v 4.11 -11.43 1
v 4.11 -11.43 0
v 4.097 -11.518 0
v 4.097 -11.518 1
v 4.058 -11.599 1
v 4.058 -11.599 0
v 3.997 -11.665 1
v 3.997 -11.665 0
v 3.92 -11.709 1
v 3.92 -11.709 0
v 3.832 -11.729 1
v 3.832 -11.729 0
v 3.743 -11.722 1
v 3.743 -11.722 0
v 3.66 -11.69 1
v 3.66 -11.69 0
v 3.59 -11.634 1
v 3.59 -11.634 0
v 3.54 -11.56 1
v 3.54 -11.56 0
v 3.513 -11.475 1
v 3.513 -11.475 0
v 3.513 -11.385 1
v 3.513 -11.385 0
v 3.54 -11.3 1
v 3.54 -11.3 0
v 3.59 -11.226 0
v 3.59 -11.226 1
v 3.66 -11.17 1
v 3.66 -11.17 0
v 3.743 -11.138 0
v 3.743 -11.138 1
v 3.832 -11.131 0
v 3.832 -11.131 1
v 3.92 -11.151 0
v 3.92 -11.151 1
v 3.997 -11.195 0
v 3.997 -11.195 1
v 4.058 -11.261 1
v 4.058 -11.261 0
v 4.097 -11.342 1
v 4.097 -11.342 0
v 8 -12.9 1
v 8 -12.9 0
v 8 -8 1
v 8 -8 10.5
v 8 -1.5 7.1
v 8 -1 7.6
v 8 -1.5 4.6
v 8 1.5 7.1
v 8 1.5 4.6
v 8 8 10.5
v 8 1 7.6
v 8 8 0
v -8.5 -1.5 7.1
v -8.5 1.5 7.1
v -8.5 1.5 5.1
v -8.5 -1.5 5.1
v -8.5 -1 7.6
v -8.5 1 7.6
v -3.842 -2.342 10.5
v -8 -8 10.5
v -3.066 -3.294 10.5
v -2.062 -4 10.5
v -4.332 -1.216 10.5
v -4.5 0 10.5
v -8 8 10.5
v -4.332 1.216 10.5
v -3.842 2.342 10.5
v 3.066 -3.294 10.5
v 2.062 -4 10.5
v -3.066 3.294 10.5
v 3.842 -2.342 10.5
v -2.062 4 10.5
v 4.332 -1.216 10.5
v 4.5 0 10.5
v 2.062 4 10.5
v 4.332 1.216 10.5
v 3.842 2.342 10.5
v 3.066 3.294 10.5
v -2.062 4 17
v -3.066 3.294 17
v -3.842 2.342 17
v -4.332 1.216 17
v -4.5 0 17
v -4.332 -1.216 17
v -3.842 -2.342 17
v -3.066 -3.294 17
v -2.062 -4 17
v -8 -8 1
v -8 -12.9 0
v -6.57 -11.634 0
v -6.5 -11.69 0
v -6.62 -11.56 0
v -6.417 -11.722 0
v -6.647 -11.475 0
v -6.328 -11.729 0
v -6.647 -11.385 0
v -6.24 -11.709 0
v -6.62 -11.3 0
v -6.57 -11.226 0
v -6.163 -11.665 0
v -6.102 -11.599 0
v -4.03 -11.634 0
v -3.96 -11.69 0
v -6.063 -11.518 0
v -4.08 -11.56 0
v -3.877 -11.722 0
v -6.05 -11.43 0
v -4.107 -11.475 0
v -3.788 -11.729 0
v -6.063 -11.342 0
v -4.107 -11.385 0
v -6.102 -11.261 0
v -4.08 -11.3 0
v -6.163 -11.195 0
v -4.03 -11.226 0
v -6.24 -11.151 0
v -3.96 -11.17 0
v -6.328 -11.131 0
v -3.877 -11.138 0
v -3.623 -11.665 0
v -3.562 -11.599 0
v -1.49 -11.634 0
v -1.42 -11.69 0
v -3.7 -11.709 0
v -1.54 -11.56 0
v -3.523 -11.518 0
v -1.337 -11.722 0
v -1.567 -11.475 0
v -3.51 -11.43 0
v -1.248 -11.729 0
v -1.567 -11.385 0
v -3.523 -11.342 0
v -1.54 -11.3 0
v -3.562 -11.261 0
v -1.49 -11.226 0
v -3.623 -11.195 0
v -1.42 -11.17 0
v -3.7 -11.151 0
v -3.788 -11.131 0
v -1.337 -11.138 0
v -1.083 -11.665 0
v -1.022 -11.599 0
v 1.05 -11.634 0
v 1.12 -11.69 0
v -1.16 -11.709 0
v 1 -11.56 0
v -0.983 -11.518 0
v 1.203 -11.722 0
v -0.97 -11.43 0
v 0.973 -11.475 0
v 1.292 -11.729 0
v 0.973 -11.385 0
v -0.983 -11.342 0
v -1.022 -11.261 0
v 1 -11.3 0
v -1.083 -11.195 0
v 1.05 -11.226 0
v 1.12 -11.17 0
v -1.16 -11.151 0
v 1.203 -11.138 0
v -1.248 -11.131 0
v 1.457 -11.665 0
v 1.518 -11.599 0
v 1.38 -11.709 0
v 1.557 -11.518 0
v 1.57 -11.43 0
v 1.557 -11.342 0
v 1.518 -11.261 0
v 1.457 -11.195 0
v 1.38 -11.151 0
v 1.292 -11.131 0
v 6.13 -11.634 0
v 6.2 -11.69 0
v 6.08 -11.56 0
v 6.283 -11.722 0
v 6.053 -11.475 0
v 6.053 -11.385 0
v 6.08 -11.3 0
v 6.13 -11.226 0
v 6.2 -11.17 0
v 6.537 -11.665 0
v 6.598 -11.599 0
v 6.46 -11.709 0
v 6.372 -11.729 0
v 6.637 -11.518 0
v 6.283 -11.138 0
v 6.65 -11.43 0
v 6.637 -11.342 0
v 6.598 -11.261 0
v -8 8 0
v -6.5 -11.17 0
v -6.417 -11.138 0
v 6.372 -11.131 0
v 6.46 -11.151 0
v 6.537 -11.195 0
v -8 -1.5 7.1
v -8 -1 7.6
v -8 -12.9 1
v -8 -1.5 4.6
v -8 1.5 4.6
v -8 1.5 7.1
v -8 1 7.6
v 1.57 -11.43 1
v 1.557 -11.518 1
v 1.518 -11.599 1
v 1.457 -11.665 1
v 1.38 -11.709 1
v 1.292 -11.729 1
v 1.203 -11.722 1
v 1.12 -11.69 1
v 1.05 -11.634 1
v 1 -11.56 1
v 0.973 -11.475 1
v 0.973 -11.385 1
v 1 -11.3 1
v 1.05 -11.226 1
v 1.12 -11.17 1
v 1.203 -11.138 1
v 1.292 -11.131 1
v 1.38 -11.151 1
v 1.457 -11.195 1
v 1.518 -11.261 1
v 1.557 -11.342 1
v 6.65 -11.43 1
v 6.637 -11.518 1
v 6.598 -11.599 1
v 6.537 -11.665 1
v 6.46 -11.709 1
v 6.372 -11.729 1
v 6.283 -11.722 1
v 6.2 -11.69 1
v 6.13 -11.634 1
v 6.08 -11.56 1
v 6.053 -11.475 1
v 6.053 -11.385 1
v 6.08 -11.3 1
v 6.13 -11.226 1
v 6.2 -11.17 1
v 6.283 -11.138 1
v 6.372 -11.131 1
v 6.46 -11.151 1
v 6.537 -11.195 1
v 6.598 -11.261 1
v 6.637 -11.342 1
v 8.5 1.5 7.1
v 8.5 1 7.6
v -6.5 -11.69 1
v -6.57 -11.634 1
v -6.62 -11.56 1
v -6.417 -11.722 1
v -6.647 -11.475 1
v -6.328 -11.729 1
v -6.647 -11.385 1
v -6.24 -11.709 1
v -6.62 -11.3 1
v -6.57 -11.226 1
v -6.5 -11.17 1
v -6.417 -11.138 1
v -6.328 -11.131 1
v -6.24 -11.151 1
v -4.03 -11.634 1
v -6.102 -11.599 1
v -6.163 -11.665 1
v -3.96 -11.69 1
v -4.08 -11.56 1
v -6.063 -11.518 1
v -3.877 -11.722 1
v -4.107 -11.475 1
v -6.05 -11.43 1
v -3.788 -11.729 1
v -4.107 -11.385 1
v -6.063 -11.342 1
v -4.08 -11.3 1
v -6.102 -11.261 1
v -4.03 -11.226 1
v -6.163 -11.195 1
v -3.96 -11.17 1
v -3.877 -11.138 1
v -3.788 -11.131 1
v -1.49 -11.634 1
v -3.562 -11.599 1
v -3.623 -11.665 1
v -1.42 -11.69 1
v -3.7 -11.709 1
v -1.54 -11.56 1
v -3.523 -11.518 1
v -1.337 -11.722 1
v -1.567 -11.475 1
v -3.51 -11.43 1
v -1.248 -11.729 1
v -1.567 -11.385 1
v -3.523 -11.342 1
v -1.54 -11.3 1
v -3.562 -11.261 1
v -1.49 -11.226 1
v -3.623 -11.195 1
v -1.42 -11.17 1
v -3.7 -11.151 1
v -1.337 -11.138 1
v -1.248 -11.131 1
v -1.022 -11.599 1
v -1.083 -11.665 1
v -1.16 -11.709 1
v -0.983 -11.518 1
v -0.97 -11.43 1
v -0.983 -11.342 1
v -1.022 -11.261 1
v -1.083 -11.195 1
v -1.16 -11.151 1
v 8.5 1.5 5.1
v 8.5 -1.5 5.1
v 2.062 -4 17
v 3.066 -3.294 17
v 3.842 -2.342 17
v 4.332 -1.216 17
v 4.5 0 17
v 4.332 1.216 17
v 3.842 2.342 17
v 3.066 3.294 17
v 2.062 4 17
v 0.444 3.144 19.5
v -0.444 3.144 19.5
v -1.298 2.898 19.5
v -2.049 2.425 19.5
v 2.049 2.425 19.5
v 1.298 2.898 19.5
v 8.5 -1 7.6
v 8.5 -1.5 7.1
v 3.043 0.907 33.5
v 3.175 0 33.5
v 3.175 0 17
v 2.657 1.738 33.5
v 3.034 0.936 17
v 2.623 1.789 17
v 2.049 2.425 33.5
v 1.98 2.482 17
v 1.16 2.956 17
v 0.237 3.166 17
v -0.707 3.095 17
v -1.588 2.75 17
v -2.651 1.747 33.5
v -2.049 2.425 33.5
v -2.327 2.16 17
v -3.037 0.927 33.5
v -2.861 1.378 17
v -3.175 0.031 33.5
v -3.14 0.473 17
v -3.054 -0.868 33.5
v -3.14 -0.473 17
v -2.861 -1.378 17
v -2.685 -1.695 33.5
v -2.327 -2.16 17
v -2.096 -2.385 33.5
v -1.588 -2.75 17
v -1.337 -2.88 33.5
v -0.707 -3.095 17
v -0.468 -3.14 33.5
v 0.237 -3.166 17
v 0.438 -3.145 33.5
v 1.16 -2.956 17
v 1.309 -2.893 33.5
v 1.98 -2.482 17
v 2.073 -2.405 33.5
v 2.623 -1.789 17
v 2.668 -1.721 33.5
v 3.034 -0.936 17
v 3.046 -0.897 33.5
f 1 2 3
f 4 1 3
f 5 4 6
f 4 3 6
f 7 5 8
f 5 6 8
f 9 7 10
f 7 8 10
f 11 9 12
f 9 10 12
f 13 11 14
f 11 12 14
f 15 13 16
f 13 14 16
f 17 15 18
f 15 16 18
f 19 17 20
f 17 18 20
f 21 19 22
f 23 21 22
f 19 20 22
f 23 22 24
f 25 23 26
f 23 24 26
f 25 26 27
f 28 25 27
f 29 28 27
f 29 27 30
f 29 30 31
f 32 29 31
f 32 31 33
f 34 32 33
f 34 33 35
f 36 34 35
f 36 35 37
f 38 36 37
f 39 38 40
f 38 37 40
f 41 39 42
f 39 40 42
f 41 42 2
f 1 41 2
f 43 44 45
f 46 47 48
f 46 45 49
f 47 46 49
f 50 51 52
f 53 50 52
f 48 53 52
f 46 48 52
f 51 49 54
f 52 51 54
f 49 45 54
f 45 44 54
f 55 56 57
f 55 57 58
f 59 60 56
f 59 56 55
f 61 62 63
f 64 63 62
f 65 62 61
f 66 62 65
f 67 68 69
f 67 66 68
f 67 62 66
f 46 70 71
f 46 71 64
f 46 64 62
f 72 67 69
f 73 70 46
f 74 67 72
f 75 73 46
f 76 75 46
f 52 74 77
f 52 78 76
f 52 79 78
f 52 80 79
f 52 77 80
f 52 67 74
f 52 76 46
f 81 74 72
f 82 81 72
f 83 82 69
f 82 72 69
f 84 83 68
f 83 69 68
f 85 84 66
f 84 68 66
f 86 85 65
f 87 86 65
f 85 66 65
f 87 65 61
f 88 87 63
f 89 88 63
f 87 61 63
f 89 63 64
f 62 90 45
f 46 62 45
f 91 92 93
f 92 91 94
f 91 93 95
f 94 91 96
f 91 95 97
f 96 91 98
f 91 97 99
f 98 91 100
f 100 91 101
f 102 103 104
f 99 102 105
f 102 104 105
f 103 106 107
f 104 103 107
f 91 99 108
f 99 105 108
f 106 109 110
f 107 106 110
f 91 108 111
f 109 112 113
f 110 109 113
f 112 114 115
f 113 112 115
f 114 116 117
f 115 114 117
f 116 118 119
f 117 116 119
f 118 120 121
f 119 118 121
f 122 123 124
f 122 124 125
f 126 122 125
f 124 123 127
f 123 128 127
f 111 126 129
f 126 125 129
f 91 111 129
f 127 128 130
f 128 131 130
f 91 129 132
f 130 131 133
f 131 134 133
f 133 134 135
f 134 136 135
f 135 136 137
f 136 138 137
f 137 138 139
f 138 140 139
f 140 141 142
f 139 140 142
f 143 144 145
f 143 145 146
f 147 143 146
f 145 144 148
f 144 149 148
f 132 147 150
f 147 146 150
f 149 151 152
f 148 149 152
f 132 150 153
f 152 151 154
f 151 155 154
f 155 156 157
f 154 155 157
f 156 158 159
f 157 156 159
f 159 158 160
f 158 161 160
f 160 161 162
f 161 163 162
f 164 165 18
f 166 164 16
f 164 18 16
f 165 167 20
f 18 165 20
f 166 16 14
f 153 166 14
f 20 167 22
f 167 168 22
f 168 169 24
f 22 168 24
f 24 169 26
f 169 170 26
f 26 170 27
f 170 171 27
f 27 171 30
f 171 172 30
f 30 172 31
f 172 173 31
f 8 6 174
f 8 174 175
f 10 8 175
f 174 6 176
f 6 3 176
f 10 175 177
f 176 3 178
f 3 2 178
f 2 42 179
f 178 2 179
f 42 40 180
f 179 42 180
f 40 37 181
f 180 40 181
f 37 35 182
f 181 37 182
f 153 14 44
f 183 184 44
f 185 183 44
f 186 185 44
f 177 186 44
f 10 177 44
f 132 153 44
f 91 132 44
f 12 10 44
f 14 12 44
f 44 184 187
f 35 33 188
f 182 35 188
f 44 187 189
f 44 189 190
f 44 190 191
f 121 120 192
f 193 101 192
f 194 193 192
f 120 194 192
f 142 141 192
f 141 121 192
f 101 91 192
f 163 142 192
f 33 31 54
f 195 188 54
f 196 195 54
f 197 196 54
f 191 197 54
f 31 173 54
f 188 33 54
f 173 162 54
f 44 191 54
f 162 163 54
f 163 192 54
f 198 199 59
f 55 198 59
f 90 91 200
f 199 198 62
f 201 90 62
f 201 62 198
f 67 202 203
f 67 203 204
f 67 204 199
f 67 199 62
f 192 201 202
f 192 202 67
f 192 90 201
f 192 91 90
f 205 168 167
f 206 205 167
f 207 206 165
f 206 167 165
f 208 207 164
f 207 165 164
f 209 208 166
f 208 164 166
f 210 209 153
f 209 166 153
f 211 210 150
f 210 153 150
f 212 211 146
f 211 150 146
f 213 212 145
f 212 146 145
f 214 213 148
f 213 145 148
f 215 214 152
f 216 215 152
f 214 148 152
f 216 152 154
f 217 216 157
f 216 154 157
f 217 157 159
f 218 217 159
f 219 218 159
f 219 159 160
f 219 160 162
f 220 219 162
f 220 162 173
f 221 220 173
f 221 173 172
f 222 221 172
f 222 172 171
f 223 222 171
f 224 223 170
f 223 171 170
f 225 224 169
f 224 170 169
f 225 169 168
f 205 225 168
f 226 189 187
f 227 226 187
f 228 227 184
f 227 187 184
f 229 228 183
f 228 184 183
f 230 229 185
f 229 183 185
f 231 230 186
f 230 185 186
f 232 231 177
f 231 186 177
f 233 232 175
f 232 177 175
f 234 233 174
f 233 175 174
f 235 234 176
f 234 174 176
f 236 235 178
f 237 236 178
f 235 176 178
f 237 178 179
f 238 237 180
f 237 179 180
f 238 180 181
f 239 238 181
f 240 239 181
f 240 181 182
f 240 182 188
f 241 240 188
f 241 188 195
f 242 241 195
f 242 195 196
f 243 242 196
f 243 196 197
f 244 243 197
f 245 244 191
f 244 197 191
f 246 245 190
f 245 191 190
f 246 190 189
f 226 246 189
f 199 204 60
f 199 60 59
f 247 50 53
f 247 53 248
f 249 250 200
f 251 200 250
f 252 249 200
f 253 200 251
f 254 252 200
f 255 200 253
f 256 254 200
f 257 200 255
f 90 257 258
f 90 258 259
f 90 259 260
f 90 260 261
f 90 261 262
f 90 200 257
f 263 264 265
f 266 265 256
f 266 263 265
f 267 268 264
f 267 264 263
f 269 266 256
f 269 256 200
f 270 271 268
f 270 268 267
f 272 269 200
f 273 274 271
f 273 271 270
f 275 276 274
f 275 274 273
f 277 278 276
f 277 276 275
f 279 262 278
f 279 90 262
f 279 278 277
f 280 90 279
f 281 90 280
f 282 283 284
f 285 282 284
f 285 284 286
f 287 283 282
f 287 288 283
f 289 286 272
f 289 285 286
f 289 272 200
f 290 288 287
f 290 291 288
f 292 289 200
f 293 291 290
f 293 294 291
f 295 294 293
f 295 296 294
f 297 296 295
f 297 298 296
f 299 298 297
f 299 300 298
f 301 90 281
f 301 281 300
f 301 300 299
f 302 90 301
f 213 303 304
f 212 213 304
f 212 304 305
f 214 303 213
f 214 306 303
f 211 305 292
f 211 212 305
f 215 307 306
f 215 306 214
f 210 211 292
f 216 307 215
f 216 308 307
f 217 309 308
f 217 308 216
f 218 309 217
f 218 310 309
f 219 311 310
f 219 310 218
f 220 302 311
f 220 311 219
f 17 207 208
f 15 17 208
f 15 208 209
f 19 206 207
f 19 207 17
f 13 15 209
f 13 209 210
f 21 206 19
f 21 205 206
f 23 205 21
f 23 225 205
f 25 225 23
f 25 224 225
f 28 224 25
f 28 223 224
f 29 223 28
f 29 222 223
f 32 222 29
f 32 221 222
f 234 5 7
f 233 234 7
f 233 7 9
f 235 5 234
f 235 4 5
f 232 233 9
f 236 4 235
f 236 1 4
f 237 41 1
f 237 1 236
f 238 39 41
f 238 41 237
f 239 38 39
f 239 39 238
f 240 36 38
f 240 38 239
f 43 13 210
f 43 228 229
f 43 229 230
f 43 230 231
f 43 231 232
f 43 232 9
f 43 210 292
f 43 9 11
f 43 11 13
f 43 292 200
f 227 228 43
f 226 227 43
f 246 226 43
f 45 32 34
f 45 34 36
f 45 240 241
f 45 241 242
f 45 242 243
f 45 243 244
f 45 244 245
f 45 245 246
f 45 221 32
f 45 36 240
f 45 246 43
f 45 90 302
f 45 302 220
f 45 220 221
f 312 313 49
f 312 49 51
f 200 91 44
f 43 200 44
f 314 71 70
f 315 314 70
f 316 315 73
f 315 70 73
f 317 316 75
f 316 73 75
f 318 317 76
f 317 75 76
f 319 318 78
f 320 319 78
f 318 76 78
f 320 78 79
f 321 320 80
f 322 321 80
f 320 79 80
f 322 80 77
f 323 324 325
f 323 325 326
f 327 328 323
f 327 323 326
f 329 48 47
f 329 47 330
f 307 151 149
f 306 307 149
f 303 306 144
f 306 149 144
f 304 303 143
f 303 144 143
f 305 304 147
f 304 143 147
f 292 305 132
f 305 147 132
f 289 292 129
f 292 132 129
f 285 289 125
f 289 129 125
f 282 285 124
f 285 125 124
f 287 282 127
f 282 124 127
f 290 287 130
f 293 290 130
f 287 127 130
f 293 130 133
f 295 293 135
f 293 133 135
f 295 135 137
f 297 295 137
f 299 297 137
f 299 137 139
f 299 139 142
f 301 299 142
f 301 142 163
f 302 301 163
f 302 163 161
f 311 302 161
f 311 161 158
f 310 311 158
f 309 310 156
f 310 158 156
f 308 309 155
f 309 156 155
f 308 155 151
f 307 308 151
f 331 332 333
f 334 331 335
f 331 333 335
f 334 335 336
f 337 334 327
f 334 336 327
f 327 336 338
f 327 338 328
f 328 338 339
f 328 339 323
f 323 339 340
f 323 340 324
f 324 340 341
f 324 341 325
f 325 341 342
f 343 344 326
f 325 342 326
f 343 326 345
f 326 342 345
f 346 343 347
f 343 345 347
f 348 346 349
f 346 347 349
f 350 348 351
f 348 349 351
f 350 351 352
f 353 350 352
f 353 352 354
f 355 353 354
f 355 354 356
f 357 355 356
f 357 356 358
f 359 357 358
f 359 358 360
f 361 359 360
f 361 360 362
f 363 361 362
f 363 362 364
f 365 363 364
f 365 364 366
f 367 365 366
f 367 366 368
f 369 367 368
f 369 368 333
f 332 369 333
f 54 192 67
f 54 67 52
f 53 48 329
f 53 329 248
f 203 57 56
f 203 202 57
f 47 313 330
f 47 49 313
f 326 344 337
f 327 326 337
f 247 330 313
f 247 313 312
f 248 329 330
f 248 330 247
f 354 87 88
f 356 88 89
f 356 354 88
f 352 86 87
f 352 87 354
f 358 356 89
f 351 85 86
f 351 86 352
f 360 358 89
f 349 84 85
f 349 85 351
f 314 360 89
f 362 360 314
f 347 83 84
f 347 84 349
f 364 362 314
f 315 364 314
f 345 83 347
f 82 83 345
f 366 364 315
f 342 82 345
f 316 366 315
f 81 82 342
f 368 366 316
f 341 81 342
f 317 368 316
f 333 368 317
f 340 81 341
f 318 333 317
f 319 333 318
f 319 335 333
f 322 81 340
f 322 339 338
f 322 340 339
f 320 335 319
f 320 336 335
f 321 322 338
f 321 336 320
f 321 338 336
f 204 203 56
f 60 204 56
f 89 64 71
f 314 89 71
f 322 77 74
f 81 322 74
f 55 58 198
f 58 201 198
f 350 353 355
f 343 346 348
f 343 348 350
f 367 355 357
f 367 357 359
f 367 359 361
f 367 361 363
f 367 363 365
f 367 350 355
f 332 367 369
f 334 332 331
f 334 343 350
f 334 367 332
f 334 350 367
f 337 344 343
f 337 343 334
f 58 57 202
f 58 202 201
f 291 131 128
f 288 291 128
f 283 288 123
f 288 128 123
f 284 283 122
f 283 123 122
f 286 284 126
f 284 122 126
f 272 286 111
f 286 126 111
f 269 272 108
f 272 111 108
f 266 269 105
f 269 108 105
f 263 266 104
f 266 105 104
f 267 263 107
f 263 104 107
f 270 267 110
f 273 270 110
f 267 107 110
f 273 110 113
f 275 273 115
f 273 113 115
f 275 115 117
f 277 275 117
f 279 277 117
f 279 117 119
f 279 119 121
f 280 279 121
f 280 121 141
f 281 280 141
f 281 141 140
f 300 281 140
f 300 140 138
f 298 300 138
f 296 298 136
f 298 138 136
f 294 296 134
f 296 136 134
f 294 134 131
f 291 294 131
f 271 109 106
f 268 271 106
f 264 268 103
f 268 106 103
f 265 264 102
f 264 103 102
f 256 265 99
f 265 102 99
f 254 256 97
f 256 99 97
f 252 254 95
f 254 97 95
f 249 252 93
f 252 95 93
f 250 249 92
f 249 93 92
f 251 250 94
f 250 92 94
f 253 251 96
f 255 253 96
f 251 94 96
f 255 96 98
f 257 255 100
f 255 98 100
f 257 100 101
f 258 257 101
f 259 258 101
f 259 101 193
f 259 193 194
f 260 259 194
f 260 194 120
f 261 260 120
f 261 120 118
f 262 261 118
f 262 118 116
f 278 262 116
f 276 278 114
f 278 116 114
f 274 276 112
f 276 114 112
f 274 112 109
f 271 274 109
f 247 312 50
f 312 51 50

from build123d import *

# Parameters (mm, degrees)
F0_W      = 16
F0_H      = 20.9
F1_DEPTH  = 1
F2_W      = 16
F2_H      = 16
F3_DEPTH  = 9.5
F5_DEPTH  = 6.5
F6_R      = 3.175
F7_DEPTH  = 16.5
F9_DEPTH  = 14
F10_R     = 0.3
F11_DEPTH = 1
F12_W     = 3
F12_H     = 3
F13_DEPTH = 0.5
F14_W     = 3
F14_H     = 3
F15_DEPTH = 0.5
F16_SIZE  = 0.5
F17_SIZE  = 0.49999
F18_SIZE  = 0.49999
F19_SIZE  = 0.5


# Not quite as in the source:
# - a fillet or chamfer is up to 0.001 mm smaller than in the source, because OpenCascade refuses the exact size


with BuildPart() as f1:
    # F0 (on Top) → F1 (new body)
    with BuildSketch(Plane.XY):
        with Locations((0, -2.45)):
            Rectangle(F0_W, F0_H)
    extrude(amount=F1_DEPTH)

    # F2 (on face) → F3 (join)
    with BuildSketch(Plane.XY.offset(1)):
        Rectangle(F2_W, F2_H)
    extrude(amount=F3_DEPTH)

    # F4 (on face) → F5 (join)
    with BuildSketch(Plane.XY.offset(10.5)):
        with BuildLine():
            Line((2.0615528128, 4), (-2.0615528128, 4))
            ThreePointArc((-2.0615528128, 4), (-4.5, 0), (-2.0615528128, -4))
            Line((-2.0615528128, -4), (2.0615528128, -4))
            ThreePointArc((2.0615528128, -4), (4.5, 0), (2.0615528128, 4))
        make_face()
    extrude(amount=F5_DEPTH)

    # F6 (on face) → F7 (join)
    with BuildSketch(Plane.XY.offset(17)):
        Circle(F6_R)
    extrude(amount=F7_DEPTH)

    # F8 (on face) → F9 (cut)
    with BuildSketch(Plane.XY.offset(33.5)):
        with BuildLine():
            ThreePointArc((2.0493901532, 2.425), (0, 3.175), (-2.0493901532, 2.425))
            Line((-2.0493901532, 2.425), (2.0493901532, 2.425))
        make_face()
    extrude(amount=-F9_DEPTH, mode=Mode.SUBTRACT)

    # F10 (on face) → F11 (cut, through all)
    with BuildSketch(Plane(origin=(0, 0, 0), x_dir=(1, 0, 0), z_dir=(0, 0, -1))):
        with Locations((-6.35, 11.43)):
            Circle(F10_R)
        with Locations((-3.81, 11.43)):
            Circle(F10_R)
        with Locations((-1.27, 11.43)):
            Circle(F10_R)
        with Locations((1.27, 11.43)):
            Circle(F10_R)
        with Locations((3.81, 11.43)):
            Circle(F10_R)
        with Locations((6.35, 11.43)):
            Circle(F10_R)
    extrude(amount=-F11_DEPTH, mode=Mode.SUBTRACT)

    # F12 (on face) → F13 (join)
    with BuildSketch(Plane(origin=(-8, 0, 0), x_dir=(0, -1, 0), z_dir=(-1, 0, 0))):
        with Locations((0, 6.1)):
            Rectangle(F12_W, F12_H)
    extrude(amount=F13_DEPTH)

    # F14 (on face) → F15 (join)
    with BuildSketch(Plane.YZ.offset(8)):
        with Locations((0, 6.1)):
            Rectangle(F14_W, F14_H)
    extrude(amount=F15_DEPTH)

    # F16
    f16_edges = [f1.edges().sort_by_distance(p)[0] for p in [
        (-8.25, 1.5, 7.6),
        (-8.25, -1.5, 7.6),
    ]]
    chamfer(f16_edges, length=F16_SIZE)

    # F17 (size 0.5 in the source; OpenCascade refuses exactly that, so slightly less here)
    f17_edges = [f1.edges().sort_by_distance(p)[0] for p in [
        (-8.5, 0, 4.6),
    ]]
    chamfer(f17_edges, length=F17_SIZE)

    # F18 (size 0.5 in the source; OpenCascade refuses exactly that, so slightly less here)
    f18_edges = [f1.edges().sort_by_distance(p)[0] for p in [
        (8.5, 0, 4.6),
    ]]
    chamfer(f18_edges, length=F18_SIZE)

    # F19
    f19_edges = [f1.edges().sort_by_distance(p)[0] for p in [
        (8.25, 1.5, 7.6),
        (8.25, -1.5, 7.6),
    ]]
    chamfer(f19_edges, length=F19_SIZE)


solid = f1.part
